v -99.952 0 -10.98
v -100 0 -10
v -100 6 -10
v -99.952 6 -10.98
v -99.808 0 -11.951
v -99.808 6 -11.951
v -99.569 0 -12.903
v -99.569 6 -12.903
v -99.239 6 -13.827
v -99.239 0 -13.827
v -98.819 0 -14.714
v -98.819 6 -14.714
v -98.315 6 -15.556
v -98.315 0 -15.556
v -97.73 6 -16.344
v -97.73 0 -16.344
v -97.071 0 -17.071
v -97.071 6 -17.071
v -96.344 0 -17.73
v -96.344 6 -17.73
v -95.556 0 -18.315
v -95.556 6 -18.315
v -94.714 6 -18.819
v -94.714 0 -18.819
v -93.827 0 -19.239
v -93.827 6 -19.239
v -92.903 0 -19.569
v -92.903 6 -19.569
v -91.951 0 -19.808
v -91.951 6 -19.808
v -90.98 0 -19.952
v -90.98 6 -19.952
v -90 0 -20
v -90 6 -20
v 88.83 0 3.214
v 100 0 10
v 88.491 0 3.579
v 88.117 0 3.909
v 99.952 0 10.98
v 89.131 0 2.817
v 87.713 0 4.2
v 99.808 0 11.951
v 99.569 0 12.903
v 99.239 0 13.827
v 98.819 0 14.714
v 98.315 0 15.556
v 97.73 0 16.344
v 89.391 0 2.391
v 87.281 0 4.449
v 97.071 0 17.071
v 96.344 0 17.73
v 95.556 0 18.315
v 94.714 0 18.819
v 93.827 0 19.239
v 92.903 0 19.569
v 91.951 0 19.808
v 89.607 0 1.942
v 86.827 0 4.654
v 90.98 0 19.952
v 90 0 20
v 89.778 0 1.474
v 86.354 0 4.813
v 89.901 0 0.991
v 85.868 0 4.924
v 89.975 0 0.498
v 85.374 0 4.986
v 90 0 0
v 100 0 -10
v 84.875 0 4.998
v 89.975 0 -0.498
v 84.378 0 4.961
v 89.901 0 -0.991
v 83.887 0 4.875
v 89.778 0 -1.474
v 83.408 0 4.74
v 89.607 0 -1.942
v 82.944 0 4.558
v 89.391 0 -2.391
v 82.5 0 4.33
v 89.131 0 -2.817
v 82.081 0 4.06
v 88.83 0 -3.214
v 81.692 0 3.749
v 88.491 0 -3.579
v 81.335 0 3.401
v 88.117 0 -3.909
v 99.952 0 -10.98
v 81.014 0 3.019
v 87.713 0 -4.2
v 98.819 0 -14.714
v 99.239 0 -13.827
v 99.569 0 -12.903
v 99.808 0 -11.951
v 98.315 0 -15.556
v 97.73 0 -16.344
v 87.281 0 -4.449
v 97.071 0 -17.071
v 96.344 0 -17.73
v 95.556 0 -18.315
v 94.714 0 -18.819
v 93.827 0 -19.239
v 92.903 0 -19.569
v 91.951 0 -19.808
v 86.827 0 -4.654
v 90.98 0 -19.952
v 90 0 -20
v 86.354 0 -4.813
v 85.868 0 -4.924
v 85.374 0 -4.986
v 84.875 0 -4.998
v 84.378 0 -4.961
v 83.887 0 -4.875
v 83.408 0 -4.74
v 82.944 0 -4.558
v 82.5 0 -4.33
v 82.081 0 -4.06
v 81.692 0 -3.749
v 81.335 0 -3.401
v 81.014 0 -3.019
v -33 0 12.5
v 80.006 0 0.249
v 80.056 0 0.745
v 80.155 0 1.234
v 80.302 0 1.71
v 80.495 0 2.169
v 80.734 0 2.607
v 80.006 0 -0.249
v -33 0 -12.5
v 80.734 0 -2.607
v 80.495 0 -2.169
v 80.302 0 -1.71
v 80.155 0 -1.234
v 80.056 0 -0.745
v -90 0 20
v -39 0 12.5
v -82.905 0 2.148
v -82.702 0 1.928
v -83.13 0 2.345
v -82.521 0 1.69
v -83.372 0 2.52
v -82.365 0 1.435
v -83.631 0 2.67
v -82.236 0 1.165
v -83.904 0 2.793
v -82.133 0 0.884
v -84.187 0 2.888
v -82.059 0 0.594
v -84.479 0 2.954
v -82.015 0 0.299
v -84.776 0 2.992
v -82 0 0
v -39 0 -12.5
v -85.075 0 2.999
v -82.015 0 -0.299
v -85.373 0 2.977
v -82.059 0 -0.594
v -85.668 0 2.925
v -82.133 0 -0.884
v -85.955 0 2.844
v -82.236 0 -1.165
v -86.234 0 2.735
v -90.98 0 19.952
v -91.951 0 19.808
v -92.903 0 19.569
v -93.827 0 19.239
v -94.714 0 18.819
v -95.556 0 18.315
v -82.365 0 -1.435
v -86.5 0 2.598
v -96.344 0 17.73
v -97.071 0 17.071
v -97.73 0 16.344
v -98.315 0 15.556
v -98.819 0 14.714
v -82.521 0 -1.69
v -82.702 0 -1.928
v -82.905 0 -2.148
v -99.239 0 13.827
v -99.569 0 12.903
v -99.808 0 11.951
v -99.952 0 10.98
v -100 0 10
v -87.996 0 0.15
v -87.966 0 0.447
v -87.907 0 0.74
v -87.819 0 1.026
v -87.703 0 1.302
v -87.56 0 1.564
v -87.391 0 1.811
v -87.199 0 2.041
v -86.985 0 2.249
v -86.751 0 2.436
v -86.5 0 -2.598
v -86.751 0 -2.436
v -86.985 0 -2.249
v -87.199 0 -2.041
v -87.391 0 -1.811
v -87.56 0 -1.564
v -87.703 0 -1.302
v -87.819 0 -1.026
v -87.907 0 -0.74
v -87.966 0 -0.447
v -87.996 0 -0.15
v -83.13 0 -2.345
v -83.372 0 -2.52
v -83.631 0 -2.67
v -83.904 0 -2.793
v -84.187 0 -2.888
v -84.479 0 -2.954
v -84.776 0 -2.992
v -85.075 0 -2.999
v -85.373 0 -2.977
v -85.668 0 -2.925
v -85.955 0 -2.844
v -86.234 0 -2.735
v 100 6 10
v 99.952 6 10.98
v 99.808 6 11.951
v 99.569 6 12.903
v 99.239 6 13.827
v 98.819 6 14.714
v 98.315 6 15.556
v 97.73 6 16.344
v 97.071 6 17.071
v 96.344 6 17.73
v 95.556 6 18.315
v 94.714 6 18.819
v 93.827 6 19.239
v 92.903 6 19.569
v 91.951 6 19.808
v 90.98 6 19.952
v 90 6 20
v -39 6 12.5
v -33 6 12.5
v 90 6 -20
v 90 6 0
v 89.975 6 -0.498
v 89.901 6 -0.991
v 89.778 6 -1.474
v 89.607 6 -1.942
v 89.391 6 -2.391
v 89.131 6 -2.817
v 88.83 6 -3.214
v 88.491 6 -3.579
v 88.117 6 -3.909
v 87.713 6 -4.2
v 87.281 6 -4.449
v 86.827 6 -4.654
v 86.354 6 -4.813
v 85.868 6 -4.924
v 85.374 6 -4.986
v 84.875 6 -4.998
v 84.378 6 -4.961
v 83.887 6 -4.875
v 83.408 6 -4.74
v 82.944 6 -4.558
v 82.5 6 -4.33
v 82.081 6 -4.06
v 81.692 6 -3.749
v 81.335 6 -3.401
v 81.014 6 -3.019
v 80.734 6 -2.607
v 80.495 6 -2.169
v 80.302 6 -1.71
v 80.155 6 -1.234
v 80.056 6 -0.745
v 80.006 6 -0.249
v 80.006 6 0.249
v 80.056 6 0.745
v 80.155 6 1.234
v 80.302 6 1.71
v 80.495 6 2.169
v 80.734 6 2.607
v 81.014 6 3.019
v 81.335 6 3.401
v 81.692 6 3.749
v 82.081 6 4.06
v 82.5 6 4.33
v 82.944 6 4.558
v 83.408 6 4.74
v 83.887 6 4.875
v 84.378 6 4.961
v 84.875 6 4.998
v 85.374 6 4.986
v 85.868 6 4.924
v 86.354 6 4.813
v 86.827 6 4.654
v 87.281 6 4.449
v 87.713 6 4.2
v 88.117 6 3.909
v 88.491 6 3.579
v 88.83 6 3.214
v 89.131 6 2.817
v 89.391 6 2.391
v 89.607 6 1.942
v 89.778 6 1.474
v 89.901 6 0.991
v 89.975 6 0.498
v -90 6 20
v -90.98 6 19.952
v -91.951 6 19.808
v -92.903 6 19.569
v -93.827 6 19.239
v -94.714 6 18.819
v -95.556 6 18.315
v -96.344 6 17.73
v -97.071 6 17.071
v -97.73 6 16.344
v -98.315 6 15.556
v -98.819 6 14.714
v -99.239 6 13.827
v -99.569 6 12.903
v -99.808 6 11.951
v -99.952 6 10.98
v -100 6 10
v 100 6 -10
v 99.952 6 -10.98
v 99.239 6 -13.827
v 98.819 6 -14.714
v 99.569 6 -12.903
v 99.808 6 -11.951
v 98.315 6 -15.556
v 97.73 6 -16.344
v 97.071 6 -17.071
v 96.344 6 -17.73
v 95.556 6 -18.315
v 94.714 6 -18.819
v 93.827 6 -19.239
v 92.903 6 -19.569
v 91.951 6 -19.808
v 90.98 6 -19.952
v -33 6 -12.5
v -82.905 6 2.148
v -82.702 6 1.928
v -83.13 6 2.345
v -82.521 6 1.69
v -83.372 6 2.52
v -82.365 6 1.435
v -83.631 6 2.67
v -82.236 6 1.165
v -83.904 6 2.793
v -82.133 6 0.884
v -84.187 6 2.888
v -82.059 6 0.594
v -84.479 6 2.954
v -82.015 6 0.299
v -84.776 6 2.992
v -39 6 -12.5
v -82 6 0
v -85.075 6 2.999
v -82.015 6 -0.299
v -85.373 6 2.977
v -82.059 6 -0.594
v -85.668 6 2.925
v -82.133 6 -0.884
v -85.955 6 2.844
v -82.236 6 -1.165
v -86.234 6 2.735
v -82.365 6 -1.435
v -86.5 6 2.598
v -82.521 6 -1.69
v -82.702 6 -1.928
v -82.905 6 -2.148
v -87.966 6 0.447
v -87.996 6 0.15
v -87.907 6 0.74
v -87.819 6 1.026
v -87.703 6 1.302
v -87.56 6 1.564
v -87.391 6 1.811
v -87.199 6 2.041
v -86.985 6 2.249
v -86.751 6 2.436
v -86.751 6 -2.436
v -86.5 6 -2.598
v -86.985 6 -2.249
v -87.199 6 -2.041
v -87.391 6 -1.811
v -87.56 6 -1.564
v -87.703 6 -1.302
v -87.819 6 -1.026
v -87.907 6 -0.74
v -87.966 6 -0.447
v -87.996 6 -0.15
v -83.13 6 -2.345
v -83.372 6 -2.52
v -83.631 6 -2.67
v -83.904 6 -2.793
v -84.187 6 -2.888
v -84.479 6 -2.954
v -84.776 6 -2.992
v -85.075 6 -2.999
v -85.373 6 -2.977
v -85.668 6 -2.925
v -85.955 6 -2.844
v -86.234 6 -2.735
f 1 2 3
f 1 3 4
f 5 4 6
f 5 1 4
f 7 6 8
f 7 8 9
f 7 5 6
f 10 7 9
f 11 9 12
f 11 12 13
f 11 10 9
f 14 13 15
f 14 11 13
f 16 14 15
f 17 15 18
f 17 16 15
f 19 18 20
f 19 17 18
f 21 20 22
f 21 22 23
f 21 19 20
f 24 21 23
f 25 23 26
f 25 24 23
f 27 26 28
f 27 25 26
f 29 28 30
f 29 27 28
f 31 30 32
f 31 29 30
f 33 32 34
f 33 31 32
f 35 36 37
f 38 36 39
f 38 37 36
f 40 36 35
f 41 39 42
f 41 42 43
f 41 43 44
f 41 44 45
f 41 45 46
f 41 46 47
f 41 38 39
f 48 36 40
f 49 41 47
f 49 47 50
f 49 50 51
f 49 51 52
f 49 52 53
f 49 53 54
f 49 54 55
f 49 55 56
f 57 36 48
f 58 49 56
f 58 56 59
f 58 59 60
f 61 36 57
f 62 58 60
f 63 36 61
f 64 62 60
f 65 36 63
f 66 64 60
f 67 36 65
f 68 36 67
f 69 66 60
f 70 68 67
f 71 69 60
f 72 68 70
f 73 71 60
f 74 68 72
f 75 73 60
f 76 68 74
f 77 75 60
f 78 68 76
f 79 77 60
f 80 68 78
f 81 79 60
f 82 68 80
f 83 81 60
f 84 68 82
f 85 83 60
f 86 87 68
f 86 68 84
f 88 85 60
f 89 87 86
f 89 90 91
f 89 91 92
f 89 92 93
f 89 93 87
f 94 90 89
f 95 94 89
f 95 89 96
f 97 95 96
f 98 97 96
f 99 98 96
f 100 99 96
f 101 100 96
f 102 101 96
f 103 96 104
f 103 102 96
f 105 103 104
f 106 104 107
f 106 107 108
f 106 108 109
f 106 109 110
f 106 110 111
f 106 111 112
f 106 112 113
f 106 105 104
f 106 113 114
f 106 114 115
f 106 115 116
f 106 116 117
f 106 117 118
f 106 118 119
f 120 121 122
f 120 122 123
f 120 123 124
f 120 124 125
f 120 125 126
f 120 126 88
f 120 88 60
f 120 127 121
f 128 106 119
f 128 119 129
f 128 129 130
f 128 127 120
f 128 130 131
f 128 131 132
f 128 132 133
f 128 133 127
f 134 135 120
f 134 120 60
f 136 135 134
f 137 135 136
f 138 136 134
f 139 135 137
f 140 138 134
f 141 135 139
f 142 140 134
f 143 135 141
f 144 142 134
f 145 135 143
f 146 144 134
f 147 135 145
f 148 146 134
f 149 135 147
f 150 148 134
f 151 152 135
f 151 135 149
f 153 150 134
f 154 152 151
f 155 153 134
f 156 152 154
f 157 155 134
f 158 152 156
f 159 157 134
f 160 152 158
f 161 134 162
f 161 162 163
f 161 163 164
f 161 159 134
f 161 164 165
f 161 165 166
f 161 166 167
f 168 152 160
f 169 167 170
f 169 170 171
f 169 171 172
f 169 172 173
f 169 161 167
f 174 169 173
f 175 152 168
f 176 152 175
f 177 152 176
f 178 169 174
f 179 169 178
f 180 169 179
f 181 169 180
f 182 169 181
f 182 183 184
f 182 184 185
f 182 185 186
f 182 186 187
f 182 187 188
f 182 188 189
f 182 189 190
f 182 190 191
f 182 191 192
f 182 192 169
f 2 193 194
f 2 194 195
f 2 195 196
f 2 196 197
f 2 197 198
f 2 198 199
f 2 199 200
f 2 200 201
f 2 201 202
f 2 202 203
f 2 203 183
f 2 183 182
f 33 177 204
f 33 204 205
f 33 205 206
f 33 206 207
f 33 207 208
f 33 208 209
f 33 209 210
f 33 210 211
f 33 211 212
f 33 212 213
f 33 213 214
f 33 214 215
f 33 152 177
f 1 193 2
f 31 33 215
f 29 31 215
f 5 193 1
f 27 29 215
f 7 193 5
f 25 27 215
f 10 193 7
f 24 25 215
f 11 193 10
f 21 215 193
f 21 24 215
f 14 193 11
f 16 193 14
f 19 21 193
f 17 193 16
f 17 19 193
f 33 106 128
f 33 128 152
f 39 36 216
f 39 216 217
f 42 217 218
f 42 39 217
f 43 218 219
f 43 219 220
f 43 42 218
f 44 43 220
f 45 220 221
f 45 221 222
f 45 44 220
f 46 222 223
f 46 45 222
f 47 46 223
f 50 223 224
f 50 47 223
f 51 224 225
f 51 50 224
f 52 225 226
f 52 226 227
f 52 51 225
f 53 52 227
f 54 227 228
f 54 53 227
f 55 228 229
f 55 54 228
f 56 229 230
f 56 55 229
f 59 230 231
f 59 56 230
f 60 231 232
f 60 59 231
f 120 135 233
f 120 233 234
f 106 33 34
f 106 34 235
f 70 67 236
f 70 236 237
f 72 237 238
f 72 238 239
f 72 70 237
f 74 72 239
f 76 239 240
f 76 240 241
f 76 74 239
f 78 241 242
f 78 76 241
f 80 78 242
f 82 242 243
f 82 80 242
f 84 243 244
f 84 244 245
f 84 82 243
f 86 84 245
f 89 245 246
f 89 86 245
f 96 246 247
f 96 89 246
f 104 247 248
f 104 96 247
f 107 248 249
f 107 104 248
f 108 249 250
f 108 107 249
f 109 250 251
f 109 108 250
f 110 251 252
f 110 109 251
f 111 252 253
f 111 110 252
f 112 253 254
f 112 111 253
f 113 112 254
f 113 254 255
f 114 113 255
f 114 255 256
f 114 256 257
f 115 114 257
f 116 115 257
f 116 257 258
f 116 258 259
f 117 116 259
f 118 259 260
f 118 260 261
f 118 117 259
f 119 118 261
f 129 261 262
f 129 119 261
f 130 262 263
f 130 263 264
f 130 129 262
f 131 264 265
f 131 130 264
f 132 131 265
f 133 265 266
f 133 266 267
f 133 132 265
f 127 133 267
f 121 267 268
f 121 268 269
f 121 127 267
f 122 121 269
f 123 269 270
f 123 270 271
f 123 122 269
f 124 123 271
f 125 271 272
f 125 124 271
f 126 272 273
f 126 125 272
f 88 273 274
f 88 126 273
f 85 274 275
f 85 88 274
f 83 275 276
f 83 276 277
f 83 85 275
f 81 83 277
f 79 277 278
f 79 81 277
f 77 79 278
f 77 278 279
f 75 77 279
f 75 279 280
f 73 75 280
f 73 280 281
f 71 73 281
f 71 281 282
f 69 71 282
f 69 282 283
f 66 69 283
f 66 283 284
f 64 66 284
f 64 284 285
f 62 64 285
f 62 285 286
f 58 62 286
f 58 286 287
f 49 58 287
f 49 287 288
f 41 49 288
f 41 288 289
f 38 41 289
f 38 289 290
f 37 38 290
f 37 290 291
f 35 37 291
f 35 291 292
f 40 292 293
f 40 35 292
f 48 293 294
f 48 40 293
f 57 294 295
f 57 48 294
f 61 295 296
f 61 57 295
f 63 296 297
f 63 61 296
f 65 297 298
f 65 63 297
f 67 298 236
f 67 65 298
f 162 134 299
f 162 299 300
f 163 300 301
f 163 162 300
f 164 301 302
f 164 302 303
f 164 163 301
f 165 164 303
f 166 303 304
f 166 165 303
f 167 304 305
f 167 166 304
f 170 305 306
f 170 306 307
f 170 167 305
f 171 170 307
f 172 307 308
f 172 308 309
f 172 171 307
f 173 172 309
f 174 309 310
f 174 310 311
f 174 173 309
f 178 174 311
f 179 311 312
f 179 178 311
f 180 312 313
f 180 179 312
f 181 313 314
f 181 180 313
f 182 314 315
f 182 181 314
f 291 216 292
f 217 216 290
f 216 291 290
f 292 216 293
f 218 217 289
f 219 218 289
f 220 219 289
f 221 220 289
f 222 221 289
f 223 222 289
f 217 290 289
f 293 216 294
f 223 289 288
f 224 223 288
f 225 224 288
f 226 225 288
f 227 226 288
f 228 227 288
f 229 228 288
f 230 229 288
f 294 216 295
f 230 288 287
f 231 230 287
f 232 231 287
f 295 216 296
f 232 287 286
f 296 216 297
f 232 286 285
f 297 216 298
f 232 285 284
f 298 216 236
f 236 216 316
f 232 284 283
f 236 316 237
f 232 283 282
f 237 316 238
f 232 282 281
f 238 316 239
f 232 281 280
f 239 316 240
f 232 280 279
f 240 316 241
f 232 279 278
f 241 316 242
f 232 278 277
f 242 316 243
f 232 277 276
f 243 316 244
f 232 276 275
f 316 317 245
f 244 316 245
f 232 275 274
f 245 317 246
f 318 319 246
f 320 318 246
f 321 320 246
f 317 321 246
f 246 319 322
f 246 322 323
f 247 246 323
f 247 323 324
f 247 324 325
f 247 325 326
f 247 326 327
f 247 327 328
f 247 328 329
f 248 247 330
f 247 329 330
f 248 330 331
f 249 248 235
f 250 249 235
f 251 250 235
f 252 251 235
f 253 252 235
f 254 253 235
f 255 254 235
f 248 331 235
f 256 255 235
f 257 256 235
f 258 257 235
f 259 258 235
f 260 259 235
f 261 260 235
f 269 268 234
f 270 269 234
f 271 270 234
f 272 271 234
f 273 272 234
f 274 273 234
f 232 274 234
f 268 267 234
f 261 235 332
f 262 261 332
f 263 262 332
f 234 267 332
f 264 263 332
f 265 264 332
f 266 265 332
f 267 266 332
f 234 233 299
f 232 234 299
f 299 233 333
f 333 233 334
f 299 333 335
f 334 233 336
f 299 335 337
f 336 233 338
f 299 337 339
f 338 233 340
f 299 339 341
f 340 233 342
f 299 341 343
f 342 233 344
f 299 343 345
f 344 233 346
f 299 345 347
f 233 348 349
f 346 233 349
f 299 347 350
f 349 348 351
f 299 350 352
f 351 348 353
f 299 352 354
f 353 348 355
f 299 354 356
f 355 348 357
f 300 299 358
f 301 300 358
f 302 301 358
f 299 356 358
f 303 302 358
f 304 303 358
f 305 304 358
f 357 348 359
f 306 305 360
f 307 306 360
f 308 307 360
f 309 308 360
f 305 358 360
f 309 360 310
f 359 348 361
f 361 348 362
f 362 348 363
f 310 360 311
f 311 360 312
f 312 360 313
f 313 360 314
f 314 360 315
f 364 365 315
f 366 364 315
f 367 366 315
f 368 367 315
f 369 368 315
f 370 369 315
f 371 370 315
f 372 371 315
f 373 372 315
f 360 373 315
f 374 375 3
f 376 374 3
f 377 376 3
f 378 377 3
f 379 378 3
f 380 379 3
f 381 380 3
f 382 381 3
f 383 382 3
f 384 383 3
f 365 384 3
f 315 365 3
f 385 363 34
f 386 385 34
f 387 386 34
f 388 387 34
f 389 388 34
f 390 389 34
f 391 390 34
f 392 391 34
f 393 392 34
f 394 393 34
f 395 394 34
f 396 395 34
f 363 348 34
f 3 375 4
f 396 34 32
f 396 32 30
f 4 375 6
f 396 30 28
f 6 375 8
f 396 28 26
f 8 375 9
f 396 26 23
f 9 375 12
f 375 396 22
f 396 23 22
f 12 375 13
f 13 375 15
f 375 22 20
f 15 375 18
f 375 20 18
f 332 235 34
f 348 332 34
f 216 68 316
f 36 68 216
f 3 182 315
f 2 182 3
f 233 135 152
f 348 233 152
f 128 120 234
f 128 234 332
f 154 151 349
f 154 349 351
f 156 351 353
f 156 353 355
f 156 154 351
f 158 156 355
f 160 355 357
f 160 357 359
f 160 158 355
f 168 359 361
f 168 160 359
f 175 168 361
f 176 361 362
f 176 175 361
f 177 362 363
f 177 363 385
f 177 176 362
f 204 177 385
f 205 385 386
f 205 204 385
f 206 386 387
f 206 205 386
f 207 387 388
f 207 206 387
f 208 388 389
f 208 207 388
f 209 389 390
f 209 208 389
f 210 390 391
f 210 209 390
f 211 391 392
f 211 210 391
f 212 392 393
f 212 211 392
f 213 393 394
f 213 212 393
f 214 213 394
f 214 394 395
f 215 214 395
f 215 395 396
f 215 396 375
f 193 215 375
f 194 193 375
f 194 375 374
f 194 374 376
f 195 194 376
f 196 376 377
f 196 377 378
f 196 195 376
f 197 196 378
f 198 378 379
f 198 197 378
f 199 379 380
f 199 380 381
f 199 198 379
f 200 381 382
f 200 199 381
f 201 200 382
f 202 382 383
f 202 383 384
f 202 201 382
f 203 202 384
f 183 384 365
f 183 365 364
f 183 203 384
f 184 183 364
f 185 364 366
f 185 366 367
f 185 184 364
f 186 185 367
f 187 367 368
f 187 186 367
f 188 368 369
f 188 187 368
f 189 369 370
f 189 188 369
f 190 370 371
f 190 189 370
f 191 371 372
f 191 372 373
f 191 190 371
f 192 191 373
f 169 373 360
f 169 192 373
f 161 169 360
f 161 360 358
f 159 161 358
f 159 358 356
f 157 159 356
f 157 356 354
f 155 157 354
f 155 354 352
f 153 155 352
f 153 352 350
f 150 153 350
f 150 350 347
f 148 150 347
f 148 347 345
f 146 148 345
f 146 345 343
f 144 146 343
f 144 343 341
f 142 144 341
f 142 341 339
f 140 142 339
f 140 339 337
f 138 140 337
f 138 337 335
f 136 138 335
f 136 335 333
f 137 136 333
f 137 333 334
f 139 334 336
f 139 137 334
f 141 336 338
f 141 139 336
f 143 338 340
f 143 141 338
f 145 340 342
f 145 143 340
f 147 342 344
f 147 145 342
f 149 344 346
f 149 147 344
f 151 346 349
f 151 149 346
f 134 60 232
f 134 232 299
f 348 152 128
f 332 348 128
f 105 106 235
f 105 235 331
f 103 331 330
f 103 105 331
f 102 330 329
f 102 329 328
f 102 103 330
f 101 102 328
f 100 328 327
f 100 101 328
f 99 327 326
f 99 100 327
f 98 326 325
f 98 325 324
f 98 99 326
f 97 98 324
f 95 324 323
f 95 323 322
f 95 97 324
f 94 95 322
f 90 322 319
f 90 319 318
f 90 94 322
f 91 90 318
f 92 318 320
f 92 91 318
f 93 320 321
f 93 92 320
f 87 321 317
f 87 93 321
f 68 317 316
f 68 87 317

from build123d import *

# Parameters (mm, degrees)
SKETCH2_R           = 5
SKETCH2_R_2         = 3
SKETCH2_W           = 6
SKETCH2_H           = 25
BOSS_EXTRUDE1_DEPTH = 6


with BuildPart() as part:
    # Sketch2 → Boss-Extrude1 (new body)
    with BuildSketch(Plane(origin=(0, 0, 0), x_dir=(1, 0, 0), z_dir=(0, 1, 0))):
        with BuildLine():
            Line((-90, 20), (90, 20))
            ThreePointArc((90, 20), (97.071067812, 17.071067812), (100, 10))
            Line((100, 10), (100, -10))
            ThreePointArc((100, -10), (97.071067812, -17.071067812), (90, -20))
            Line((90, -20), (-90, -20))
            ThreePointArc((-90, -20), (-97.071067812, -17.071067812), (-100, -10))
            Line((-100, -10), (-100, 10))
            ThreePointArc((-100, 10), (-97.071067812, 17.071067812), (-90, 20))
        make_face()
        with Locations((85, 0)):
            Circle(SKETCH2_R, mode=Mode.SUBTRACT)
        with Locations((-85, 0)):
            Circle(SKETCH2_R_2, mode=Mode.SUBTRACT)
        with Locations((-36, 0)):
            Rectangle(SKETCH2_W, SKETCH2_H, mode=Mode.SUBTRACT)
    extrude(amount=BOSS_EXTRUDE1_DEPTH)


solid = part.part
